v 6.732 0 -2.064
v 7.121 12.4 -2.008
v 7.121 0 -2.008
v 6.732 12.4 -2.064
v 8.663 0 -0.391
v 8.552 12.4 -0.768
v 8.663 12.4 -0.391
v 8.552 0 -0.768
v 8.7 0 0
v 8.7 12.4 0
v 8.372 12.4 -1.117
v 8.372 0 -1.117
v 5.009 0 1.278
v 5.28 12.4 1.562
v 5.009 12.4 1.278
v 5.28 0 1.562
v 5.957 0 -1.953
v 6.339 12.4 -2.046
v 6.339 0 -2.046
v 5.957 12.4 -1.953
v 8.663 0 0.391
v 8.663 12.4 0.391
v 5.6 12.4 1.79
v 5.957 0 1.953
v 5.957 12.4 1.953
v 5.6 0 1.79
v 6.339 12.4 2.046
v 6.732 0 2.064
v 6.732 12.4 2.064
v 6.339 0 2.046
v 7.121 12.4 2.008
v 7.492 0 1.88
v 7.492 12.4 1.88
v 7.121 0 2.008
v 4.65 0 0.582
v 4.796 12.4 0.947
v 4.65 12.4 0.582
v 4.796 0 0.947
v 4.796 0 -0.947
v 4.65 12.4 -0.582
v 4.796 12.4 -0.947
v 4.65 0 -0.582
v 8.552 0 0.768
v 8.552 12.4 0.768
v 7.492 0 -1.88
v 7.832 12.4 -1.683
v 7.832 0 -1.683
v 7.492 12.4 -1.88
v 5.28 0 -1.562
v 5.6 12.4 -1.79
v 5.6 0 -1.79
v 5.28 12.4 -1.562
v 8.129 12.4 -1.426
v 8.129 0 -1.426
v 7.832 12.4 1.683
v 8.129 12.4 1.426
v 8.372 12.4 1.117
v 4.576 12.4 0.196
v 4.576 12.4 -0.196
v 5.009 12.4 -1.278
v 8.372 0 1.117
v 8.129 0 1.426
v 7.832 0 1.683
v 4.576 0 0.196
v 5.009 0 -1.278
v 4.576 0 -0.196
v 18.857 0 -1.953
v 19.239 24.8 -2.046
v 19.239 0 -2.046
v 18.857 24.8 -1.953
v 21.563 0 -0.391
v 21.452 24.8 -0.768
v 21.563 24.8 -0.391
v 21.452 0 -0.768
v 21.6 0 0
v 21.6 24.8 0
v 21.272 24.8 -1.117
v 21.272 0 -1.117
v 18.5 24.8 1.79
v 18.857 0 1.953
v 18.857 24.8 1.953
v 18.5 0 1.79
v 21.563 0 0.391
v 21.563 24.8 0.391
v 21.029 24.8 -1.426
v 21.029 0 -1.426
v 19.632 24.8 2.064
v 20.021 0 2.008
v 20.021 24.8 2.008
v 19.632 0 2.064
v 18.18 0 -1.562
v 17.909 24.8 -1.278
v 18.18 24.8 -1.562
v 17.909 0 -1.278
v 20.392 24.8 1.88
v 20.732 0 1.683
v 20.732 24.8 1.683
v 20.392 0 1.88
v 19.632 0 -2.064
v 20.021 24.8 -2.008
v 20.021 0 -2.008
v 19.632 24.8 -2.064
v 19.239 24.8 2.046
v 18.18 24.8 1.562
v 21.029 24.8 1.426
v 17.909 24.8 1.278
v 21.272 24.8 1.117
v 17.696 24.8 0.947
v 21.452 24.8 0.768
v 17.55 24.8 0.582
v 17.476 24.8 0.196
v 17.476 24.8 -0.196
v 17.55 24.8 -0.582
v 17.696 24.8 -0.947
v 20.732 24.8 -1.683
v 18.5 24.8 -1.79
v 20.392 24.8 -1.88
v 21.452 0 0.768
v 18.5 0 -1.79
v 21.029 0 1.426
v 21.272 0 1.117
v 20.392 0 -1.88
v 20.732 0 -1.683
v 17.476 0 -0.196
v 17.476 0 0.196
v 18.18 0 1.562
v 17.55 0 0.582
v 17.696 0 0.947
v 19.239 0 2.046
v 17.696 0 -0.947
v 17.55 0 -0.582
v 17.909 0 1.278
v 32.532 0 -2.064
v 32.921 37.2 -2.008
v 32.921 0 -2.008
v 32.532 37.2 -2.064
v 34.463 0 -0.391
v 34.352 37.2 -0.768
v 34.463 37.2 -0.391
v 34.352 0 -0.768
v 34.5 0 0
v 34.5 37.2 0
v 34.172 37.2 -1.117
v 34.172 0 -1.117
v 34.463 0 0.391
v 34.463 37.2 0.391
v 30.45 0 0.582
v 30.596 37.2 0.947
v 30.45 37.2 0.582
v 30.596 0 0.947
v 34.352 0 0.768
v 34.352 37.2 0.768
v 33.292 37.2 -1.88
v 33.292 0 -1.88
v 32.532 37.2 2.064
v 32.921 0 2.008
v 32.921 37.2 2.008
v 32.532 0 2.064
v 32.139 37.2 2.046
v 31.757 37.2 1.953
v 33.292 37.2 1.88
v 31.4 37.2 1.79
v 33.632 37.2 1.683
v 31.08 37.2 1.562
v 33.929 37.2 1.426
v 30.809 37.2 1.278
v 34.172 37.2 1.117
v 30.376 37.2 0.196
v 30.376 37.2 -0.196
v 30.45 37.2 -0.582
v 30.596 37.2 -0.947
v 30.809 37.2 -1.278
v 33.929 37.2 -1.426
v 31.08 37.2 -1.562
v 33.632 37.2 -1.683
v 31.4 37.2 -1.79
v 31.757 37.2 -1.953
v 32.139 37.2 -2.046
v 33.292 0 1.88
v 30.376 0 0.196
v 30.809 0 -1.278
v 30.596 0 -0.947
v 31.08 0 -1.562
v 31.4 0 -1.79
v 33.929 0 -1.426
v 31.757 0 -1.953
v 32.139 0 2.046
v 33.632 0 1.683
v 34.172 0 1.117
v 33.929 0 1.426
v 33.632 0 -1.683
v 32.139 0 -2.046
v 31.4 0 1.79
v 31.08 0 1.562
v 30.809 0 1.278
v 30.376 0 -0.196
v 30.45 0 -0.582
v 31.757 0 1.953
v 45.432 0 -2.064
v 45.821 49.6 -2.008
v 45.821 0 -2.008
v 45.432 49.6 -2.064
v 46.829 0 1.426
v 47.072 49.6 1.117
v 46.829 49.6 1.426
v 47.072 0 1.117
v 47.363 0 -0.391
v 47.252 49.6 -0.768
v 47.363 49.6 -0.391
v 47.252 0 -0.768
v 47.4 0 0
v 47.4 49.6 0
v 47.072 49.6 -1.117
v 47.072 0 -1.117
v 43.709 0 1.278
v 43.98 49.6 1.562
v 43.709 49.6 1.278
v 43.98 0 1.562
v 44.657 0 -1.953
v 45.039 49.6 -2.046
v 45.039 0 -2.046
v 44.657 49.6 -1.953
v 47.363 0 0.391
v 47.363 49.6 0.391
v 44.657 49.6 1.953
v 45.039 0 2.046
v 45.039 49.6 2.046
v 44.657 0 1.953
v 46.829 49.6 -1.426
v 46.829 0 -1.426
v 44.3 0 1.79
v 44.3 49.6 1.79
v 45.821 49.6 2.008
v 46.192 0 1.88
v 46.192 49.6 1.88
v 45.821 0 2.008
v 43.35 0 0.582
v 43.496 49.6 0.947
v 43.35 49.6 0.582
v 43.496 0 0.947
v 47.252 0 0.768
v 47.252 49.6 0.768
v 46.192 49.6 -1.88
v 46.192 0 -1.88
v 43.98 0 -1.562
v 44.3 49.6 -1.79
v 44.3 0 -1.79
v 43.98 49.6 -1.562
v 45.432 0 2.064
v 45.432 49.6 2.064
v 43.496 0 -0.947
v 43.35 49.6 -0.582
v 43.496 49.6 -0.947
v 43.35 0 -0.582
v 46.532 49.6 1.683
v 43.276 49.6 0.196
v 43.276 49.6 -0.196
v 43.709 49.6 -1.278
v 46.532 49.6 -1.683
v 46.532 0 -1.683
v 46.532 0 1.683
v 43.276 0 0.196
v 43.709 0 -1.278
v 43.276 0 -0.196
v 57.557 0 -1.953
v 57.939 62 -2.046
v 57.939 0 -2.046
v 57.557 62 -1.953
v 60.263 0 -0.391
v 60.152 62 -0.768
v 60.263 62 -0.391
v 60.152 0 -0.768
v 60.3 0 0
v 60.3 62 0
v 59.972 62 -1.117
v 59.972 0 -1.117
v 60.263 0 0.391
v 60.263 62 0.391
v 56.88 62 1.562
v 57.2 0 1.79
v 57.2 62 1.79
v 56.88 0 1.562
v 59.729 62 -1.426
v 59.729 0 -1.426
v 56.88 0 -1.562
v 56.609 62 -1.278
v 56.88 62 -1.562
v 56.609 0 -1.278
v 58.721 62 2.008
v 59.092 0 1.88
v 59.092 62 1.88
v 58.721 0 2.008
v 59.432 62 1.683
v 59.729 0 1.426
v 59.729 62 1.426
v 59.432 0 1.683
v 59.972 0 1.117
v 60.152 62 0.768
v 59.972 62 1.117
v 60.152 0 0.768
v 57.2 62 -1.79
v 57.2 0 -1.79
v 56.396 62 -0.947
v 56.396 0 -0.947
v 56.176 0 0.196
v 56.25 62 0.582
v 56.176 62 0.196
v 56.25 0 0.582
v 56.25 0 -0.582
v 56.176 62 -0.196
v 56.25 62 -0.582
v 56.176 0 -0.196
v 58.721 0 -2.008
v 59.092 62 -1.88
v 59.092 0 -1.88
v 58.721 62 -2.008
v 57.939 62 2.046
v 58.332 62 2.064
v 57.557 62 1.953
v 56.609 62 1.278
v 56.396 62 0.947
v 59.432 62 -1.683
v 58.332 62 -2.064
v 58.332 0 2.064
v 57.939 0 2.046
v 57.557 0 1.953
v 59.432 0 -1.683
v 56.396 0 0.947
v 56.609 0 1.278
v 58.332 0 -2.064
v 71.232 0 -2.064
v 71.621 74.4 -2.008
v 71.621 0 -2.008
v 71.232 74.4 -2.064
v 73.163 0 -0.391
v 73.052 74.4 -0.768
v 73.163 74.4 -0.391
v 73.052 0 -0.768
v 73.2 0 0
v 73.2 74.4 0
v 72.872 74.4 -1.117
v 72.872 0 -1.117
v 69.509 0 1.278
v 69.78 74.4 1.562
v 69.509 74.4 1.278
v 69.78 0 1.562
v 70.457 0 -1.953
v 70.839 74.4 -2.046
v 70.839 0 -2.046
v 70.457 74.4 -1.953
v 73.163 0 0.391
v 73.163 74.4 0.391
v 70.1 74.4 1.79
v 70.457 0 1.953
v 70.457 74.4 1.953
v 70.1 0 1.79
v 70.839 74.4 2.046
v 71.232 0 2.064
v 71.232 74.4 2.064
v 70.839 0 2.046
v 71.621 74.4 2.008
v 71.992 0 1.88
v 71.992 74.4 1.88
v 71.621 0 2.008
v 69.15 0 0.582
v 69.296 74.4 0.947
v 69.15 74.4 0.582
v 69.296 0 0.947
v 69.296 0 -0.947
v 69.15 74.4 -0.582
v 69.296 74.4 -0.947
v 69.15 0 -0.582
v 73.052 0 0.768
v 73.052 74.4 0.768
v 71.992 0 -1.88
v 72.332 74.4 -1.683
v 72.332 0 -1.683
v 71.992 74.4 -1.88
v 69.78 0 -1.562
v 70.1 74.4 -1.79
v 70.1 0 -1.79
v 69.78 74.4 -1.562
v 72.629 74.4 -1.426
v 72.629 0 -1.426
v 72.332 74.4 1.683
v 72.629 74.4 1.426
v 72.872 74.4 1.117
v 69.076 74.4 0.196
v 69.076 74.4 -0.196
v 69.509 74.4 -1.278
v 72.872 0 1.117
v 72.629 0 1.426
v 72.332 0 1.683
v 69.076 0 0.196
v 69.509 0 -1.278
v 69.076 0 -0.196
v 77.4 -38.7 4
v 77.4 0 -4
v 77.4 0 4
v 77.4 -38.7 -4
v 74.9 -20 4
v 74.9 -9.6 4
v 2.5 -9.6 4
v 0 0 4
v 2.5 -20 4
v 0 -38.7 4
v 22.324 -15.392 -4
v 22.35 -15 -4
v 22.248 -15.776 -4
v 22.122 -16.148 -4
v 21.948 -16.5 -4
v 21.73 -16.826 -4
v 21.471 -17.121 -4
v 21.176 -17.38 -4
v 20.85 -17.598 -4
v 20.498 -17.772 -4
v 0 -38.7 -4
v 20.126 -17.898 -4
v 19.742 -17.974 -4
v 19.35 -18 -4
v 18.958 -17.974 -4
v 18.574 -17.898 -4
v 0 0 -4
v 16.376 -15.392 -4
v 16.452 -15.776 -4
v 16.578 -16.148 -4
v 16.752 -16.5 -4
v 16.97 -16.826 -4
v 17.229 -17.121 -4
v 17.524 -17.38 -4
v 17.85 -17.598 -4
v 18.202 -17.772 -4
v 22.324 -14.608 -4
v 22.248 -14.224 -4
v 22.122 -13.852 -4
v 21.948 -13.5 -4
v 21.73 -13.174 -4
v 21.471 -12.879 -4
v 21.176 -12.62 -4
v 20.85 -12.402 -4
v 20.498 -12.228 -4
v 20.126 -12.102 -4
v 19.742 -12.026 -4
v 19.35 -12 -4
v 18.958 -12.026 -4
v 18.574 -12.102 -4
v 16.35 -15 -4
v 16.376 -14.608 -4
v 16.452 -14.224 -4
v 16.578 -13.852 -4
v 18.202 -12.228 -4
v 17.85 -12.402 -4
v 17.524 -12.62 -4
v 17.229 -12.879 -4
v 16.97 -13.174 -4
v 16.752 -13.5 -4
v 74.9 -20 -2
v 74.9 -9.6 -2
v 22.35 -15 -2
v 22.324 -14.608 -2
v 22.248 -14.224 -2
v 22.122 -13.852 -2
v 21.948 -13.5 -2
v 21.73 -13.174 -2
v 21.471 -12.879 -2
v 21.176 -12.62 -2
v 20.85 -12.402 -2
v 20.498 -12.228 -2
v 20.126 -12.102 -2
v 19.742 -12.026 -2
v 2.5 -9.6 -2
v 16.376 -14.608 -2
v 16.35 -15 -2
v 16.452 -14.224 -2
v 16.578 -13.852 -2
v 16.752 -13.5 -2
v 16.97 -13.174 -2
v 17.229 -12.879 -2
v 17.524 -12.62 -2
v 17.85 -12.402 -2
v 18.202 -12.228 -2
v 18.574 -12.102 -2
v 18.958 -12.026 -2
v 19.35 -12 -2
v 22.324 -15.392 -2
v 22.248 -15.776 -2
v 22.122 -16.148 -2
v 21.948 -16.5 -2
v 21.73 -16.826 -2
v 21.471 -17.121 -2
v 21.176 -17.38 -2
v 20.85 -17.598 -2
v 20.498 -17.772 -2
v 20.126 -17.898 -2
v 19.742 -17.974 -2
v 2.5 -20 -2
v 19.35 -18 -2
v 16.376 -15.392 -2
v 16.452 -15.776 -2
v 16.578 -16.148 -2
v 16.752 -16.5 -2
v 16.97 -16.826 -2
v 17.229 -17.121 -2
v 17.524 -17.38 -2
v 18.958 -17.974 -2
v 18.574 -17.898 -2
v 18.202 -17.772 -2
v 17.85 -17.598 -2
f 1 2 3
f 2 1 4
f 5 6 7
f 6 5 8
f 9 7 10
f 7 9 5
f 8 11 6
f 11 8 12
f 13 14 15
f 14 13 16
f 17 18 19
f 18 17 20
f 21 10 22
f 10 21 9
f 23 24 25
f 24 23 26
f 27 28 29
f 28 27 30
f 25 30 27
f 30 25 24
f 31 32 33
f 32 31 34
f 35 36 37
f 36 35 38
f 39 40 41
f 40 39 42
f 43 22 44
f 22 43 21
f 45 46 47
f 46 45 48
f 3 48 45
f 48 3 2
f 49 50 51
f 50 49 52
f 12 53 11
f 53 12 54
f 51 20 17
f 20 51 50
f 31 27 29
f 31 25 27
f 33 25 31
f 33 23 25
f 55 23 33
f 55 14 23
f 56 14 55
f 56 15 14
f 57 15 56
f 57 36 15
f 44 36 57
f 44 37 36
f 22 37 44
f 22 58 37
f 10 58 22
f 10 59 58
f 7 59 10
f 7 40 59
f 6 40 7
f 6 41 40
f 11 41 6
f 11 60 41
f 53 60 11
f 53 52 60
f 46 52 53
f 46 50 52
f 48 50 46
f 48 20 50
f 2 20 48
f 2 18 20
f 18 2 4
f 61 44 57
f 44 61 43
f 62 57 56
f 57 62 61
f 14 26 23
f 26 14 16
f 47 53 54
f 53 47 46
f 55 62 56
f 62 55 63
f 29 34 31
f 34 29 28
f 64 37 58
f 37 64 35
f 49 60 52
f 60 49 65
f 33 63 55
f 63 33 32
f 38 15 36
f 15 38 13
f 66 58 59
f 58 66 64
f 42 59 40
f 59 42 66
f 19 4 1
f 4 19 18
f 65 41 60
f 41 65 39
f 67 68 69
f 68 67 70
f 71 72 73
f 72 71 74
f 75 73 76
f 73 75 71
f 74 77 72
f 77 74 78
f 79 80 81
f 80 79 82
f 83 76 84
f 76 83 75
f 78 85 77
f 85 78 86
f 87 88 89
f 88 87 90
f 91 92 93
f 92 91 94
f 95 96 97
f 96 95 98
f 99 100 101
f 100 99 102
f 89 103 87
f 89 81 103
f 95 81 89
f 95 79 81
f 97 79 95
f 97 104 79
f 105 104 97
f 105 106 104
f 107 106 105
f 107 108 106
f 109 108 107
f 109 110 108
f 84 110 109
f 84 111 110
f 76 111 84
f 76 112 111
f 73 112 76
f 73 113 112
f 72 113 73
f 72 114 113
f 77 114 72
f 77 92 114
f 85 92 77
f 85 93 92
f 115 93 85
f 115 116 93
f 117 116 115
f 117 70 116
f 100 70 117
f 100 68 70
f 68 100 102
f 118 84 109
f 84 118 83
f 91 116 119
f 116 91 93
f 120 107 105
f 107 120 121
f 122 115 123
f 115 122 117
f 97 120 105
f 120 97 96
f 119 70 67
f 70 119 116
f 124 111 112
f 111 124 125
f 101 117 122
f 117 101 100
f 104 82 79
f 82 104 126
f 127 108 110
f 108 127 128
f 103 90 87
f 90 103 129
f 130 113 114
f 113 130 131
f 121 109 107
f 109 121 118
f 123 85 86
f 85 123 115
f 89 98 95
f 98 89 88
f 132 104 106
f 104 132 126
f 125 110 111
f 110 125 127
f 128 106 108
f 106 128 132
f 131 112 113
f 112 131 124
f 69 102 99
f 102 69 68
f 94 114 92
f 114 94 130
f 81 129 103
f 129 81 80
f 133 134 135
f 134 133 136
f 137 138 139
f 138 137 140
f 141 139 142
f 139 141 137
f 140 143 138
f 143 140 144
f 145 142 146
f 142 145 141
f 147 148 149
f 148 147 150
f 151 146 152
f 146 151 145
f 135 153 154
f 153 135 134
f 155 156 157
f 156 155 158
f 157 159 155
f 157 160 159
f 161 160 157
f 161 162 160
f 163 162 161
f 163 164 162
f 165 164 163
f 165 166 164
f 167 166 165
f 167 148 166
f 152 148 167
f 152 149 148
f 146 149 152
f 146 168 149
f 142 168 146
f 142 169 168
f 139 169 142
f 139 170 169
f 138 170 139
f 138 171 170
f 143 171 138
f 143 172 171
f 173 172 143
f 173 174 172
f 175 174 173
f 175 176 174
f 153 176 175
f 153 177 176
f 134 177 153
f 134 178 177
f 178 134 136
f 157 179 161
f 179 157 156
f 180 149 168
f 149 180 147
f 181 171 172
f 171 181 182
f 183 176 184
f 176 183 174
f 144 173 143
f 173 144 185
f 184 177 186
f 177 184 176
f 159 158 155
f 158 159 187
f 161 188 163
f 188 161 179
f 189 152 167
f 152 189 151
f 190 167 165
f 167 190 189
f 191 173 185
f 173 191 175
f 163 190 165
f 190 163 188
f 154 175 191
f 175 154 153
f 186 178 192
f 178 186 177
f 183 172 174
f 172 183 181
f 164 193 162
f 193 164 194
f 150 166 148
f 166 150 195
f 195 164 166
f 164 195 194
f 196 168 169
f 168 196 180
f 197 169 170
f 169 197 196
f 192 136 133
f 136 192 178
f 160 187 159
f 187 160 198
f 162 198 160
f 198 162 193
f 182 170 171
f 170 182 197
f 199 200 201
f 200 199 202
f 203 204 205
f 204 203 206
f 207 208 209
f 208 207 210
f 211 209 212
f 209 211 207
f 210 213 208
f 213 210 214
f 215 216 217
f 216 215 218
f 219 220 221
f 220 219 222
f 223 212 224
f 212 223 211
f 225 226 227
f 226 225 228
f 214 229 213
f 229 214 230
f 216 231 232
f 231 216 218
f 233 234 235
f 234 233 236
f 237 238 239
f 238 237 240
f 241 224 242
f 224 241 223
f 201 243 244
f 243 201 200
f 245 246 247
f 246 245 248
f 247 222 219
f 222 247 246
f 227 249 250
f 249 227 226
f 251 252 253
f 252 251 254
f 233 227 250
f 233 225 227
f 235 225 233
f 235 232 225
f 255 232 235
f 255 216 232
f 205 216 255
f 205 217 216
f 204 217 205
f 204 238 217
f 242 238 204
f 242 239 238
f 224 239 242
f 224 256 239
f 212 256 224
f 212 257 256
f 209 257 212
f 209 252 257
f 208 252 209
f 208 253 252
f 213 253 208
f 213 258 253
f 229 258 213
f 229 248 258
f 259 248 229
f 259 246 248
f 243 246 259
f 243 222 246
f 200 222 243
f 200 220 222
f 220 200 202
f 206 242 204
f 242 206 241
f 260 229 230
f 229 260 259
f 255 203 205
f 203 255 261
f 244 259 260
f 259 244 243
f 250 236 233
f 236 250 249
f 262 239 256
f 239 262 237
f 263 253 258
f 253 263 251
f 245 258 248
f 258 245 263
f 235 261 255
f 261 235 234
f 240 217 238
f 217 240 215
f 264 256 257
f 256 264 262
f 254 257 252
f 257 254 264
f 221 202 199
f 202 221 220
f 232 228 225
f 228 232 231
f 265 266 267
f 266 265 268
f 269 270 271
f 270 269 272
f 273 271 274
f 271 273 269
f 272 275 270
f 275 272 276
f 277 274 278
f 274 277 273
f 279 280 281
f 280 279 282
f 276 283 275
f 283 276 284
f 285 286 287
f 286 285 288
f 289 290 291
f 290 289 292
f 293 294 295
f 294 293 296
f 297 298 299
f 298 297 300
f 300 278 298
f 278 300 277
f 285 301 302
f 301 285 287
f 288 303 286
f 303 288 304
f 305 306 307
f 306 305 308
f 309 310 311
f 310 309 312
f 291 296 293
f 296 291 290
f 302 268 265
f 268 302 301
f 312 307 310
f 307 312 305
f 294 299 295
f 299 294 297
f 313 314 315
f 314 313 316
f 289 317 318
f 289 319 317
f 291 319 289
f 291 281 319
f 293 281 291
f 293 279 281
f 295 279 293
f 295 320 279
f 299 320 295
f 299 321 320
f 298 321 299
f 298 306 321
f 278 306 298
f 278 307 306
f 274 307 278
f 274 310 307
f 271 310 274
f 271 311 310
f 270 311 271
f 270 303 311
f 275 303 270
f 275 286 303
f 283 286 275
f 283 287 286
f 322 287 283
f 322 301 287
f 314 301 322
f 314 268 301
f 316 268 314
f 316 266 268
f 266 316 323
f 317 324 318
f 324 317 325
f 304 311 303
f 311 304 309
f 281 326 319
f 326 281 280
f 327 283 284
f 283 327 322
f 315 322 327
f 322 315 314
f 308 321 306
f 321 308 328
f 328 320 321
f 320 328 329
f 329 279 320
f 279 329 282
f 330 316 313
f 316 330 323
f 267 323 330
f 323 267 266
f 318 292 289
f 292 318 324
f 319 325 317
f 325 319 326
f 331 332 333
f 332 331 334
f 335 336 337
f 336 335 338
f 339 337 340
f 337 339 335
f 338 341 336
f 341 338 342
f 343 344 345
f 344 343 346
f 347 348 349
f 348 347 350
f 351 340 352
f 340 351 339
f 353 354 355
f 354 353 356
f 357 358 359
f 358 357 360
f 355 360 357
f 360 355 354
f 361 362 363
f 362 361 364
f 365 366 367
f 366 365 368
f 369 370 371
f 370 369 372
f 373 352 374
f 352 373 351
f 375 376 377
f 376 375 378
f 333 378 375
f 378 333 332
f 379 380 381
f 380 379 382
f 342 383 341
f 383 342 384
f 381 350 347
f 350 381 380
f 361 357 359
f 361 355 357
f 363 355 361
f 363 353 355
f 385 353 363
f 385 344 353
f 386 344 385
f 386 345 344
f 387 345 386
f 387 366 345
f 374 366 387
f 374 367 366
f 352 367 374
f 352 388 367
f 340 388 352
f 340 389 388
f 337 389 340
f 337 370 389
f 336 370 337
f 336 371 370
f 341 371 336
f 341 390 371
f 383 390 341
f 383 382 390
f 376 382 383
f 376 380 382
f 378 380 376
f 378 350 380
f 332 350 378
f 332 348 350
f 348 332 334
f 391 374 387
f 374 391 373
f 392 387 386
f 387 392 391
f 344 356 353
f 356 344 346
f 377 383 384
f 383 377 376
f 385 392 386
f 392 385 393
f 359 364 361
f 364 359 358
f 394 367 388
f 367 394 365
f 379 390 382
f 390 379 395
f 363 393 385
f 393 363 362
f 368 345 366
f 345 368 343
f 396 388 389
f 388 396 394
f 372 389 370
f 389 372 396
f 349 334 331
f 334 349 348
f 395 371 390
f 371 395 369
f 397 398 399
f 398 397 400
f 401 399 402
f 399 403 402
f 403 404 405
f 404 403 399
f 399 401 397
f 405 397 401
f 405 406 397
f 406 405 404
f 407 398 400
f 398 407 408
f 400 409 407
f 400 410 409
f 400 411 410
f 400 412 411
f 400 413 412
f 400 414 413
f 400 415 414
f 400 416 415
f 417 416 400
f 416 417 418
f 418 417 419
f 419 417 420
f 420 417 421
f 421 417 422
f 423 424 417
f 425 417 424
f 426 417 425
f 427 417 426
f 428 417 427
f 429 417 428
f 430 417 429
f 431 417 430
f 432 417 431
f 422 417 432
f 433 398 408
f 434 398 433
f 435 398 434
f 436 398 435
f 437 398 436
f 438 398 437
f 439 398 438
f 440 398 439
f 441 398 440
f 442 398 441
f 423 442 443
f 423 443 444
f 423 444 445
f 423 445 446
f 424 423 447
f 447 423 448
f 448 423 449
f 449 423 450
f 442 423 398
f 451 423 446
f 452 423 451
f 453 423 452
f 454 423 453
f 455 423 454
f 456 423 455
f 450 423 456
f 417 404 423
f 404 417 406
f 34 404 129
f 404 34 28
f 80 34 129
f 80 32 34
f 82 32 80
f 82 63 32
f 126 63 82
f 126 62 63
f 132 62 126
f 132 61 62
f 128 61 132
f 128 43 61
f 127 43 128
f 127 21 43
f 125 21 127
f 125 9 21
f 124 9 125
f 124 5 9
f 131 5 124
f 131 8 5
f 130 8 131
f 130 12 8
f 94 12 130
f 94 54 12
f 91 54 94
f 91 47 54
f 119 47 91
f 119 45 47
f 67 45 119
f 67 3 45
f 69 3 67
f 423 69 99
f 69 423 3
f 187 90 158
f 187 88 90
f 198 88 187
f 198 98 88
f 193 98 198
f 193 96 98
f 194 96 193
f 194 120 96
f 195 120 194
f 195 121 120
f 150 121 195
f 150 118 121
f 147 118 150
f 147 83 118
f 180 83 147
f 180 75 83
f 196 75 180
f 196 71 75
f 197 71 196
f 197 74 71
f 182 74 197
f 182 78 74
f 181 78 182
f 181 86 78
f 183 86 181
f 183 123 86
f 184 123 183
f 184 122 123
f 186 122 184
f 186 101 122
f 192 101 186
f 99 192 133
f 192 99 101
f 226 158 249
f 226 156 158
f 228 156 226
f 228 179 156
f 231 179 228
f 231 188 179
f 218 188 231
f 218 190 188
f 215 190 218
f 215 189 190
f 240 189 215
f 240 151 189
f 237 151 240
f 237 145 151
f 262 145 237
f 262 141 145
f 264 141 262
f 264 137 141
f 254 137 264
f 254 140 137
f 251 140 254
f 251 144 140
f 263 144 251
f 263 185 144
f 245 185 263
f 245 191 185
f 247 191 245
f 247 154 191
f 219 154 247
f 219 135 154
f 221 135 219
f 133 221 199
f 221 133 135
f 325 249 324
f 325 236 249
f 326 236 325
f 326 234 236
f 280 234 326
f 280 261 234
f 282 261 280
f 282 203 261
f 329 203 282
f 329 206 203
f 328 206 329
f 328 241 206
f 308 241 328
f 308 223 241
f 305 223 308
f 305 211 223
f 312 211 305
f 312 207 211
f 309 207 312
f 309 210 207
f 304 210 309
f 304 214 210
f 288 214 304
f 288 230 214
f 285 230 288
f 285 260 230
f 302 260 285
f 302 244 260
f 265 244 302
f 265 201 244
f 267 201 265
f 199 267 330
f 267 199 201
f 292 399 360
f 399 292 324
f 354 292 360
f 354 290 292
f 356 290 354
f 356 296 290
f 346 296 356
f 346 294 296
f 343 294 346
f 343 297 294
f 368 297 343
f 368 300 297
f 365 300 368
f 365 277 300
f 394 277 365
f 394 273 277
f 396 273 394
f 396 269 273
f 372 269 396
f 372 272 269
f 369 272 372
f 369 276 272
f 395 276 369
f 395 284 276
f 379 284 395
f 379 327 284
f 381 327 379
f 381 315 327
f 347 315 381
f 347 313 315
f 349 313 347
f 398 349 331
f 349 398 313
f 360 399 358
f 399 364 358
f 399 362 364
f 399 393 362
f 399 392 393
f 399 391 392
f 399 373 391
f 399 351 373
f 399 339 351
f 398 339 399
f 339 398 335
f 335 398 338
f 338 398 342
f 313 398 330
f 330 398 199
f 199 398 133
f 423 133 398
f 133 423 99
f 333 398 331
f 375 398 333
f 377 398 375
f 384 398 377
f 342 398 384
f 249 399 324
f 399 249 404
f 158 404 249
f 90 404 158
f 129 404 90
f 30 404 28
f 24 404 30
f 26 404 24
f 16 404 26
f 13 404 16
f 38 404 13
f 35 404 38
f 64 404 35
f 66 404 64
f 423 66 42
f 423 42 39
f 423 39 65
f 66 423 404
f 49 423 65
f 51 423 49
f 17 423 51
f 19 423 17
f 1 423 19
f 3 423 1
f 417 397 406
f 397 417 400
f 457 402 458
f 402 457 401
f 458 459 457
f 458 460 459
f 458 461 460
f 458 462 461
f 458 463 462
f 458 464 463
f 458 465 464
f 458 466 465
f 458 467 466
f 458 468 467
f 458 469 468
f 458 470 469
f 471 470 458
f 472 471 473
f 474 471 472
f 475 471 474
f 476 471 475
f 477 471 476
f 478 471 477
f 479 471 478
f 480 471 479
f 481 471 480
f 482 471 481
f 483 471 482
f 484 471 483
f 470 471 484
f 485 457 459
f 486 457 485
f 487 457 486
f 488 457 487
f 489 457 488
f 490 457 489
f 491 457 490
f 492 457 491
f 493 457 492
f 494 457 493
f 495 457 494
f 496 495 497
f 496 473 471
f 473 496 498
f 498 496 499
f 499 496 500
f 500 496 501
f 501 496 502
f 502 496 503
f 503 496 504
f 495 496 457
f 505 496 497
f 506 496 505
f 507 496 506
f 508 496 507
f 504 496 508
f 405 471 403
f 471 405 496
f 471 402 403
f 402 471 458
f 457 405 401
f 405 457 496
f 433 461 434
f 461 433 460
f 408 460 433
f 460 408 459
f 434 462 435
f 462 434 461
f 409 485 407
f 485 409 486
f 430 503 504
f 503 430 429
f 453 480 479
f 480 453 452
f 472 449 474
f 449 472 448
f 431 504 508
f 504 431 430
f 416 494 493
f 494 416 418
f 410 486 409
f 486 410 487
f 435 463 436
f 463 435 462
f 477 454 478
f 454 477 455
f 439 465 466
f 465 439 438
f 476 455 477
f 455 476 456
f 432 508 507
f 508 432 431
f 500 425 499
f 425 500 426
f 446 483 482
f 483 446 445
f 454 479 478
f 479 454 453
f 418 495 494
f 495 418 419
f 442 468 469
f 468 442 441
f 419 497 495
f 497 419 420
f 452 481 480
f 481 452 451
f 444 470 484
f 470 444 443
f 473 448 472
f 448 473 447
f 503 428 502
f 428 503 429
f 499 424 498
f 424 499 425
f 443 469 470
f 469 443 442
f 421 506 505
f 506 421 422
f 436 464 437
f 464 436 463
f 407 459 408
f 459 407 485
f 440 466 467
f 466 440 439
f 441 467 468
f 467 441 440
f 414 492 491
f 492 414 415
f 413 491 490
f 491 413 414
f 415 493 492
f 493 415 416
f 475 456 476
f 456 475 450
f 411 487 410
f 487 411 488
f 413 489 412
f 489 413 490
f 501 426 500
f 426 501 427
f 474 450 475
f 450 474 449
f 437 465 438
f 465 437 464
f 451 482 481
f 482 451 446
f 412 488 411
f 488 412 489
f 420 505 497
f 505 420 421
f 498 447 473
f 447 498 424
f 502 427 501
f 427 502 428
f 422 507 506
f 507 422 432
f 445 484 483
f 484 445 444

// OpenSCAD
$fa = 1;
$fs = 0.4;

dice = 12.4; // dice are 12x12mm, added .2 for light tollerance
guide_rail = 0.5; //support the dice down a cullomb
frame = 2; // thickness of frame

guide_rail_step = dice + guide_rail; //12.9

number_dice = 6; // number af dice in a row

inner_box_width = dice * number_dice + guide_rail*number_dice; 

hole_start = frame + dice/2 + guide_rail; //8.7

for (hole=[hole_start : guide_rail_step : inner_box_width]) {
    translate([hole-dice/6, -1, 0])
        rotate([270,0,0])
        cylinder(h=1+dice + dice*((hole-hole_start)/guide_rail_step), d=dice/3);
}

pushing_box = inner_box_width; // x and y
thickness = 8;

bearing = 10.4;

difference(){
    translate([0, -pushing_box/2, -thickness/2])
    cube([pushing_box, pushing_box/2, thickness]);

    translate([2.5, -20, -thickness/2+2])
        cube([pushing_box-5, bearing, thickness]);

    translate([pushing_box/4, -15, -thickness/2-2])
        cylinder(h=thickness, d=6);
}
